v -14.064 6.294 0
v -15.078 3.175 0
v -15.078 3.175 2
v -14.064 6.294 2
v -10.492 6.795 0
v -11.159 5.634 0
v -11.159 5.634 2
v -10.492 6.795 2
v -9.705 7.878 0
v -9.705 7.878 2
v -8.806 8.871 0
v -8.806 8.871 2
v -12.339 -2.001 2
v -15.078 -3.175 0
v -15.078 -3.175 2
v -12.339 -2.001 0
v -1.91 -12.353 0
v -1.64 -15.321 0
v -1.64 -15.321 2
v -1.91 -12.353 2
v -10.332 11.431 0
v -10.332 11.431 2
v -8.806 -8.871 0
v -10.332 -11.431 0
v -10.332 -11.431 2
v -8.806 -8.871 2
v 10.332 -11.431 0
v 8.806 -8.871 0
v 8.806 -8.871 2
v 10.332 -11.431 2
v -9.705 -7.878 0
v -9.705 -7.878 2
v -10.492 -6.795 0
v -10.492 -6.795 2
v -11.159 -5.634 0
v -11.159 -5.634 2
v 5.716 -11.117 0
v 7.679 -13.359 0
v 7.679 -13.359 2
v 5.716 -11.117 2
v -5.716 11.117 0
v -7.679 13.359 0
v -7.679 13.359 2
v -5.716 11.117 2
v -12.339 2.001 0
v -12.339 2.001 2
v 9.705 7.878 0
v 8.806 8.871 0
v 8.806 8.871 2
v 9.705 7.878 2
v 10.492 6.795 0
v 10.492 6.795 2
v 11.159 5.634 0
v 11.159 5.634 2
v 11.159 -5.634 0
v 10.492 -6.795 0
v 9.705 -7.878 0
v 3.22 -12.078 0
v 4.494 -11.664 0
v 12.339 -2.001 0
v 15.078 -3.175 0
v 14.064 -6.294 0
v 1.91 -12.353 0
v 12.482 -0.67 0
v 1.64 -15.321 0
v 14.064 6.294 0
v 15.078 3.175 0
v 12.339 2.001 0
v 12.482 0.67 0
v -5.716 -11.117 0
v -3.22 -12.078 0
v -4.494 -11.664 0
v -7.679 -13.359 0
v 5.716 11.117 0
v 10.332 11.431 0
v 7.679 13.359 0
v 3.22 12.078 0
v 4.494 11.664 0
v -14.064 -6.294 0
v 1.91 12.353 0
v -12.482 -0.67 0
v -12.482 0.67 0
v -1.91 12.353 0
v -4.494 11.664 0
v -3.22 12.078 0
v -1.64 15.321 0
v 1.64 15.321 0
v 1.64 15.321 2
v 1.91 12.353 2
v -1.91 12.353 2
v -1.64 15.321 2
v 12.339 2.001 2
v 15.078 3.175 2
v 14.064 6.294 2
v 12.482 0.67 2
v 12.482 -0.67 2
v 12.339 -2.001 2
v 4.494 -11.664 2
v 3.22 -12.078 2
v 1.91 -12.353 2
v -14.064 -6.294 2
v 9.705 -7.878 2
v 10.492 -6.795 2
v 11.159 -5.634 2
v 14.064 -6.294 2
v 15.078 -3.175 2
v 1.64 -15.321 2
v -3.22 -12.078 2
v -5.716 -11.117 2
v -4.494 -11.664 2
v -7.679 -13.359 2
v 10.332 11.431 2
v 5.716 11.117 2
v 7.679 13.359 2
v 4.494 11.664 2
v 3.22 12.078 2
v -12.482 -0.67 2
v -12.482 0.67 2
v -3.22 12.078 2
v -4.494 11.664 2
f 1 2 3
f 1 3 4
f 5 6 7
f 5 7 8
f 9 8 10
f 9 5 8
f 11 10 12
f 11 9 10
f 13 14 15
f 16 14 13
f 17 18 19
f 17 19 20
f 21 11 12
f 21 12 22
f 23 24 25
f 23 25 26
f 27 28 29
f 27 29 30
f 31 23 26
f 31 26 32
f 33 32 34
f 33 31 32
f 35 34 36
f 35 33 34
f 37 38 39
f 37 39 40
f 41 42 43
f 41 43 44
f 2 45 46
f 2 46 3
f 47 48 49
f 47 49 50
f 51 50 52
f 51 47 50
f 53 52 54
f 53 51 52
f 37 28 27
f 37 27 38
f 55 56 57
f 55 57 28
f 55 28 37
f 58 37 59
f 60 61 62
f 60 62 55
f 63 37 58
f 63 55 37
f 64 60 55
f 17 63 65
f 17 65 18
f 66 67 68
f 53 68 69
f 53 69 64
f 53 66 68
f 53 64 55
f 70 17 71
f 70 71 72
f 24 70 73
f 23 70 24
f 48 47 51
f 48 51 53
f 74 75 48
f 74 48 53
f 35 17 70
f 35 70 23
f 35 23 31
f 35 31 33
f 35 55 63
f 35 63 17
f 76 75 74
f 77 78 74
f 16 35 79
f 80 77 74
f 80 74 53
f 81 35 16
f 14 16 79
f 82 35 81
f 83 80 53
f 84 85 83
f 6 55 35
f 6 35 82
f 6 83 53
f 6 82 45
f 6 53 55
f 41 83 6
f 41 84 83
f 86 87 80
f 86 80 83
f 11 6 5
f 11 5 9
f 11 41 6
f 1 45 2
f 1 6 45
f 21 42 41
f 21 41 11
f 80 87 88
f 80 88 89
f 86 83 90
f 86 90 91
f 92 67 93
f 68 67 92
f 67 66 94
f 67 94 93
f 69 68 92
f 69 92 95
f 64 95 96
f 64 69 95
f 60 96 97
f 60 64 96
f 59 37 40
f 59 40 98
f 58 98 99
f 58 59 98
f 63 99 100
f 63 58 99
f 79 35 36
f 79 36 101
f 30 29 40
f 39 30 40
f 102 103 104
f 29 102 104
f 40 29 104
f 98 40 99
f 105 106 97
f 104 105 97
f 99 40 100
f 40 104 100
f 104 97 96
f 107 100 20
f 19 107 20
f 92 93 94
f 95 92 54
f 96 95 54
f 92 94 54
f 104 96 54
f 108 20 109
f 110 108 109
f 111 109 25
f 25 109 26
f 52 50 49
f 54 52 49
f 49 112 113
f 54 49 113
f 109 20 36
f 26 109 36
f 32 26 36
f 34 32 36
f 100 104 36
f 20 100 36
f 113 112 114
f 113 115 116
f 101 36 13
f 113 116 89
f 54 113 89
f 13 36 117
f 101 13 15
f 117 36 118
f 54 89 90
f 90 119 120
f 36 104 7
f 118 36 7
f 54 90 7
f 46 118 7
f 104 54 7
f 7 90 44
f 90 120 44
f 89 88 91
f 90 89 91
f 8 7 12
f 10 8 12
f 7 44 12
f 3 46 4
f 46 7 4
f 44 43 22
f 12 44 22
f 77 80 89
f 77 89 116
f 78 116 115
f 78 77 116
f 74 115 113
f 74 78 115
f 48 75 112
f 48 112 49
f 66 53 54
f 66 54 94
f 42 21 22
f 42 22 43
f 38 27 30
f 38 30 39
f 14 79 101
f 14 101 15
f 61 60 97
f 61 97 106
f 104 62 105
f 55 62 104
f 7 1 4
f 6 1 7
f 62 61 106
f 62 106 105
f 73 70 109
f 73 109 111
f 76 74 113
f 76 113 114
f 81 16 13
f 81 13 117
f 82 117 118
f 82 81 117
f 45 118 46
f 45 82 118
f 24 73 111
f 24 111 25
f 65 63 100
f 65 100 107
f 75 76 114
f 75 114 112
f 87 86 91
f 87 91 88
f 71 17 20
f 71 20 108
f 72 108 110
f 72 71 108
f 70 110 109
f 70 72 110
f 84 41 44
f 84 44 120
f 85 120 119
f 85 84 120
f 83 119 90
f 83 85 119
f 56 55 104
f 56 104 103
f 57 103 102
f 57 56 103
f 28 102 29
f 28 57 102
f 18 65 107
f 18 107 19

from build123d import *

# Parameters (mm, degrees)
SALIENTE_EXTRUIR1_DEPTH = 2


with BuildPart() as part:
    # Croquis1 → Saliente-Extruir1 (new body)
    with BuildSketch(Plane.XY):
        with BuildLine():
            Line((-1.909727018, 12.353256361), (-1.639945169, 15.320856699))
            Line((-1.639945169, 15.320856699), (1.639945169, 15.320856699))
            Line((1.639945169, 15.320856699), (1.909727018, 12.353256361))
            ThreePointArc((1.909727018, 12.353256361), (3.86271243, 11.888206454), (5.716060295, 11.116503709))
            Line((5.716060295, 11.116503709), (7.678630109, 13.358769022))
            Line((7.678630109, 13.358769022), (10.332117131, 11.430897853))
            Line((10.332117131, 11.430897853), (8.806063519, 8.871484955))
            ThreePointArc((8.806063519, 8.871484955), (10.11271243, 7.347315654), (11.158506856, 5.633624476))
            Line((11.158506856, 5.633624476), (14.064229672, 6.294085627))
            Line((14.064229672, 6.294085627), (15.077771526, 3.174724549))
            Line((15.077771526, 3.174724549), (12.338783063, 2.001107827))
            ThreePointArc((12.338783063, 2.001107827), (12.5, 0), (12.338783063, -2.001107827))
            Line((12.338783063, -2.001107827), (15.077771526, -3.174724549))
            Line((15.077771526, -3.174724549), (14.064229672, -6.294085627))
            Line((14.064229672, -6.294085627), (11.158506856, -5.633624476))
            ThreePointArc((11.158506856, -5.633624476), (10.11271243, -7.347315654), (8.806063519, -8.871484955))
            Line((8.806063519, -8.871484955), (10.332117131, -11.430897853))
            Line((10.332117131, -11.430897853), (7.678630109, -13.358769022))
            Line((7.678630109, -13.358769022), (5.716060295, -11.116503709))
            ThreePointArc((5.716060295, -11.116503709), (3.86271243, -11.888206454), (1.909727018, -12.353256361))
            Line((1.909727018, -12.353256361), (1.639945169, -15.320856699))
            Line((1.639945169, -15.320856699), (-1.639945169, -15.320856699))
            Line((-1.639945169, -15.320856699), (-1.909727018, -12.353256361))
            ThreePointArc((-1.909727018, -12.353256361), (-3.86271243, -11.888206454), (-5.716060295, -11.116503709))
            Line((-5.716060295, -11.116503709), (-7.678630109, -13.358769022))
            Line((-7.678630109, -13.358769022), (-10.332117131, -11.430897853))
            Line((-10.332117131, -11.430897853), (-8.806063519, -8.871484955))
            ThreePointArc((-8.806063519, -8.871484955), (-10.11271243, -7.347315654), (-11.158506856, -5.633624476))
            Line((-11.158506856, -5.633624476), (-14.064229672, -6.294085627))
            Line((-14.064229672, -6.294085627), (-15.077771526, -3.174724549))
            Line((-15.077771526, -3.174724549), (-12.338783063, -2.001107827))
            ThreePointArc((-12.338783063, -2.001107827), (-12.5, 0), (-12.338783063, 2.001107827))
            Line((-12.338783063, 2.001107827), (-15.077771526, 3.174724549))
            Line((-15.077771526, 3.174724549), (-14.064229672, 6.294085627))
            Line((-14.064229672, 6.294085627), (-11.158506856, 5.633624476))
            ThreePointArc((-11.158506856, 5.633624476), (-10.11271243, 7.347315654), (-8.806063519, 8.871484955))
            Line((-8.806063519, 8.871484955), (-10.332117131, 11.430897853))
            Line((-10.332117131, 11.430897853), (-7.678630109, 13.358769022))
            Line((-7.678630109, 13.358769022), (-5.716060295, 11.116503709))
            ThreePointArc((-5.716060295, 11.116503709), (-3.86271243, 11.888206454), (-1.909727018, 12.353256361))
        make_face()
    extrude(amount=SALIENTE_EXTRUIR1_DEPTH)


solid = part.part
